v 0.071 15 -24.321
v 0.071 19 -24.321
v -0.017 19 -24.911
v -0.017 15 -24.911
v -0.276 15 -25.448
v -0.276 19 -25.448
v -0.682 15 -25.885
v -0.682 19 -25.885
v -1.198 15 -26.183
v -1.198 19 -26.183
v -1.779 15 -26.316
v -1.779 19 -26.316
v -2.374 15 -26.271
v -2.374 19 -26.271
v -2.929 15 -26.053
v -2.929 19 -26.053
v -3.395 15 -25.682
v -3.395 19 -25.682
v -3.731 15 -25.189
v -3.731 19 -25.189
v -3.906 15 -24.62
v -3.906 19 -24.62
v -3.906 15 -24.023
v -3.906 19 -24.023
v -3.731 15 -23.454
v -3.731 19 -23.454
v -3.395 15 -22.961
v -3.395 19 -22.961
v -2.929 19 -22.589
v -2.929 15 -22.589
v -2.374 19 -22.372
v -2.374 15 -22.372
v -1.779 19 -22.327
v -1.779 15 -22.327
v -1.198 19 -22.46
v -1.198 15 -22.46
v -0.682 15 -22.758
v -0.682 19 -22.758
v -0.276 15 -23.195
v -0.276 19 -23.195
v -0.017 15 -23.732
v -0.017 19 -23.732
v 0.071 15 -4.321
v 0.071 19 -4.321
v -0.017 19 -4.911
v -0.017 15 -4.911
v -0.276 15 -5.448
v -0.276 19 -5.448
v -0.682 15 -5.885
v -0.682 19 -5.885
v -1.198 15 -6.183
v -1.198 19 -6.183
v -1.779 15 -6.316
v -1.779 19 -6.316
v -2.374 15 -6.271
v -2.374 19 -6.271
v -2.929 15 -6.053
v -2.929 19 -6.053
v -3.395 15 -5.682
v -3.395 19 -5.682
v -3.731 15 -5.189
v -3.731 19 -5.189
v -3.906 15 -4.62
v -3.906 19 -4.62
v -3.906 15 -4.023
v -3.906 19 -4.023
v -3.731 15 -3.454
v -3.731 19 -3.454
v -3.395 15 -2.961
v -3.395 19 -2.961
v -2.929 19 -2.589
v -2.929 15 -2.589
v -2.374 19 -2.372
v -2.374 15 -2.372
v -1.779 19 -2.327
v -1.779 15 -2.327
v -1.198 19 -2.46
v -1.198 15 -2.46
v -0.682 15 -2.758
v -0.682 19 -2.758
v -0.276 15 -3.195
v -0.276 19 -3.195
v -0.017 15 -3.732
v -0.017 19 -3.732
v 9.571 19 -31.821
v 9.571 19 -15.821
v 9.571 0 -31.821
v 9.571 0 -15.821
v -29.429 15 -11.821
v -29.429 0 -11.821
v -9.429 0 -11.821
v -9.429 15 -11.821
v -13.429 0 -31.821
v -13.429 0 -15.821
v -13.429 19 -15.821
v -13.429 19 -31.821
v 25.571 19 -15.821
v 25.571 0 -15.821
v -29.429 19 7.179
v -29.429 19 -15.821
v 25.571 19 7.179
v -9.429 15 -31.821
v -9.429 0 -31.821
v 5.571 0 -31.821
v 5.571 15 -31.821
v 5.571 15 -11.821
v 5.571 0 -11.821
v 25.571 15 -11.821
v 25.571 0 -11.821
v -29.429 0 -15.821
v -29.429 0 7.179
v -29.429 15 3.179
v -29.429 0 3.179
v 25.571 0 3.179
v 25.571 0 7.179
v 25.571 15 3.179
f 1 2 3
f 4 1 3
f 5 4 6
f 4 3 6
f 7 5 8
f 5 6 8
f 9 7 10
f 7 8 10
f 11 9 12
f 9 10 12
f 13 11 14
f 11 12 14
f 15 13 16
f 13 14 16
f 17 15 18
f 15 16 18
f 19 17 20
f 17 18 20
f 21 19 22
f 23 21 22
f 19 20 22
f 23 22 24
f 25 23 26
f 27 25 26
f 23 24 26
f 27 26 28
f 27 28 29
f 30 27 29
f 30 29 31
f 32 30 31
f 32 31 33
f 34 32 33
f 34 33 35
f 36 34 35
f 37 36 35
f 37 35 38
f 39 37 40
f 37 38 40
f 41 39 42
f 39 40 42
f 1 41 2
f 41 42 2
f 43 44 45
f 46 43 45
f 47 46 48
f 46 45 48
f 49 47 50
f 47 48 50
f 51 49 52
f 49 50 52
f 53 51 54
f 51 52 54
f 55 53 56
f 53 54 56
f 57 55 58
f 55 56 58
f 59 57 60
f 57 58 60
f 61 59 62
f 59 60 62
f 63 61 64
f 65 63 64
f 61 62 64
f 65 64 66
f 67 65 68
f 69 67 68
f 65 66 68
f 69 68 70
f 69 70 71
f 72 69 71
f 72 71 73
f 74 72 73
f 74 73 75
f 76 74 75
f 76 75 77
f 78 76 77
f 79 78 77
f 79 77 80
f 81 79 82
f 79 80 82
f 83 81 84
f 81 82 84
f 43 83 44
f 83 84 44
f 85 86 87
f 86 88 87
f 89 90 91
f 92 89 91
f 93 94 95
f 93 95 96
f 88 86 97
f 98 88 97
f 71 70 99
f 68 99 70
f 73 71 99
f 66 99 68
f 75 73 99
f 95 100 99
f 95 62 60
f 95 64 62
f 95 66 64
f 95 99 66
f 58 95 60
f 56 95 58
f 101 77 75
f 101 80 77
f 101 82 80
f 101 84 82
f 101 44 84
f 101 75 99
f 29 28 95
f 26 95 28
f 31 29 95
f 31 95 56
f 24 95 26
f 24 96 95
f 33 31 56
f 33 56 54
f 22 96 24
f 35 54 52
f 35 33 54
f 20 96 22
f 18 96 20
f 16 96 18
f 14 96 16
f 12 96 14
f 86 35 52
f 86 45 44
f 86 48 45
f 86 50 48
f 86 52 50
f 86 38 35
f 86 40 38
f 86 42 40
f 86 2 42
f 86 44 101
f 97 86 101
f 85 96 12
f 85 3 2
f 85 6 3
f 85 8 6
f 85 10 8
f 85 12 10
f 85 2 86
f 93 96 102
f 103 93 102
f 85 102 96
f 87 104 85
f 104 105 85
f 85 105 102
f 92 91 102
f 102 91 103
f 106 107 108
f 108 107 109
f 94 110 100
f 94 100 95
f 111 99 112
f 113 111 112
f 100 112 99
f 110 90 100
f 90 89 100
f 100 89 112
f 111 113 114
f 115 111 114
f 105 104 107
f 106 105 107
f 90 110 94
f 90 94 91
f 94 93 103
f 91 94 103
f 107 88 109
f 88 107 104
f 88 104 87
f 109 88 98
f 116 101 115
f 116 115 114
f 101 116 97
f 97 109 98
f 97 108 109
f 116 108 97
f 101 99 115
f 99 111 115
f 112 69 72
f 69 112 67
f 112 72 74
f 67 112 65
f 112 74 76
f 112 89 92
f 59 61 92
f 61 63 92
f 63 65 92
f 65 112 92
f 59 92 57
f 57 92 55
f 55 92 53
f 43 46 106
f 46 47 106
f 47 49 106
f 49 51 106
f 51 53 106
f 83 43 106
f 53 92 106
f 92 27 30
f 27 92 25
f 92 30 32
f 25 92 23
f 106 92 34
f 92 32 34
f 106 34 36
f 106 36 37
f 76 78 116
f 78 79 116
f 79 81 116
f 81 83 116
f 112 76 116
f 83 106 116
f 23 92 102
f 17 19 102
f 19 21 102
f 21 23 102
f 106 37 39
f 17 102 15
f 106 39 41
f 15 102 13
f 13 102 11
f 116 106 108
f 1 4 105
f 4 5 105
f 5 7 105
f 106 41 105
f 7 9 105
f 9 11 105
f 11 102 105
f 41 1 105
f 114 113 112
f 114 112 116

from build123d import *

# Parameters (mm, degrees)
EXTRUDE_1_DEPTH     = 15
EXTRUDE_1_2_DEPTH   = 15
SKETCH_1_W          = 55
SKETCH_1_H          = 4
EXTRUDE_1_3_DEPTH   = 15
SKETCH_2_W          = 55
SKETCH_2_H          = 23
SKETCH_2_W_2        = 23
SKETCH_2_H_2        = 16
EXTRUDE_2_DEPTH     = 4
SKETCH_3_R          = 2
CUT_EXTRUDE_1_DEPTH = 4


with BuildPart() as part:
    # 草图1 → 凸台-拉伸1 (new body)
    with BuildSketch(Plane(origin=(0, 0, 0), x_dir=(1, 0, 0), z_dir=(0, 1, 0))):
        Polygon((-13.428571429, 15.821428571), (-29.428571429, 15.821428571), (-29.428571429, 11.821428571), (-11.428571429, 11.821428571), (-9.428571429, 11.821428571), (-9.428571429, 15.821428571), (-9.428571429, 31.821428571), (-13.428571429, 31.821428571), align=None)
    extrude(amount=EXTRUDE_1_DEPTH)



with BuildPart() as body_2:
    # 草图1 → Extrude 1 2 (new body)
    with BuildSketch(Plane(origin=(0, 0, 0), x_dir=(1, 0, 0), z_dir=(0, 1, 0))):
        Polygon((9.571428571, 31.821428571), (5.571428571, 31.821428571), (5.571428571, 15.821428571), (5.571428571, 11.821428571), (14.214285714, 11.821428571), (25.571428571, 11.821428571), (25.571428571, 15.821428571), (9.571428571, 15.821428571), align=None)
    extrude(amount=EXTRUDE_1_2_DEPTH)


with BuildPart() as body_3:
    # 草图1 → Extrude 1 3 (new body)
    with BuildSketch(Plane(origin=(0, 0, 0), x_dir=(1, 0, 0), z_dir=(0, 1, 0))):
        with Locations((-1.928571429, -5.178571429)):
            Rectangle(SKETCH_1_W, SKETCH_1_H)
    extrude(amount=EXTRUDE_1_3_DEPTH)


with BuildPart() as part_1:
    add(part.part)

    add(body_2.part)  # 凸台-拉伸2 merges body 2

    add(body_3.part)  # 凸台-拉伸2 merges body 3
    # 草图2 → 凸台-拉伸2 (add)
    with BuildSketch(Plane(origin=(0, 15, 0), x_dir=(1, 0, 0), z_dir=(0, 1, 0))):
        with Locations((-1.928571429, 4.321428571)):
            Rectangle(SKETCH_2_W, SKETCH_2_H)
        with Locations((-1.928571429, 23.821428571)):
            Rectangle(SKETCH_2_W_2, SKETCH_2_H_2)
    extrude(amount=EXTRUDE_2_DEPTH)

    # 草图3 → 切除-拉伸1 (cut)
    with BuildSketch(Plane(origin=(0, 19, 0), x_dir=(1, 0, 0), z_dir=(0, 1, 0))):
        with Locations((-1.928571429, 24.321428571)):
            Circle(SKETCH_3_R)
        with Locations((-1.928571429, 4.321428571)):
            Circle(SKETCH_3_R)
    extrude(amount=-CUT_EXTRUDE_1_DEPTH, mode=Mode.SUBTRACT)


solid = part_1.part
